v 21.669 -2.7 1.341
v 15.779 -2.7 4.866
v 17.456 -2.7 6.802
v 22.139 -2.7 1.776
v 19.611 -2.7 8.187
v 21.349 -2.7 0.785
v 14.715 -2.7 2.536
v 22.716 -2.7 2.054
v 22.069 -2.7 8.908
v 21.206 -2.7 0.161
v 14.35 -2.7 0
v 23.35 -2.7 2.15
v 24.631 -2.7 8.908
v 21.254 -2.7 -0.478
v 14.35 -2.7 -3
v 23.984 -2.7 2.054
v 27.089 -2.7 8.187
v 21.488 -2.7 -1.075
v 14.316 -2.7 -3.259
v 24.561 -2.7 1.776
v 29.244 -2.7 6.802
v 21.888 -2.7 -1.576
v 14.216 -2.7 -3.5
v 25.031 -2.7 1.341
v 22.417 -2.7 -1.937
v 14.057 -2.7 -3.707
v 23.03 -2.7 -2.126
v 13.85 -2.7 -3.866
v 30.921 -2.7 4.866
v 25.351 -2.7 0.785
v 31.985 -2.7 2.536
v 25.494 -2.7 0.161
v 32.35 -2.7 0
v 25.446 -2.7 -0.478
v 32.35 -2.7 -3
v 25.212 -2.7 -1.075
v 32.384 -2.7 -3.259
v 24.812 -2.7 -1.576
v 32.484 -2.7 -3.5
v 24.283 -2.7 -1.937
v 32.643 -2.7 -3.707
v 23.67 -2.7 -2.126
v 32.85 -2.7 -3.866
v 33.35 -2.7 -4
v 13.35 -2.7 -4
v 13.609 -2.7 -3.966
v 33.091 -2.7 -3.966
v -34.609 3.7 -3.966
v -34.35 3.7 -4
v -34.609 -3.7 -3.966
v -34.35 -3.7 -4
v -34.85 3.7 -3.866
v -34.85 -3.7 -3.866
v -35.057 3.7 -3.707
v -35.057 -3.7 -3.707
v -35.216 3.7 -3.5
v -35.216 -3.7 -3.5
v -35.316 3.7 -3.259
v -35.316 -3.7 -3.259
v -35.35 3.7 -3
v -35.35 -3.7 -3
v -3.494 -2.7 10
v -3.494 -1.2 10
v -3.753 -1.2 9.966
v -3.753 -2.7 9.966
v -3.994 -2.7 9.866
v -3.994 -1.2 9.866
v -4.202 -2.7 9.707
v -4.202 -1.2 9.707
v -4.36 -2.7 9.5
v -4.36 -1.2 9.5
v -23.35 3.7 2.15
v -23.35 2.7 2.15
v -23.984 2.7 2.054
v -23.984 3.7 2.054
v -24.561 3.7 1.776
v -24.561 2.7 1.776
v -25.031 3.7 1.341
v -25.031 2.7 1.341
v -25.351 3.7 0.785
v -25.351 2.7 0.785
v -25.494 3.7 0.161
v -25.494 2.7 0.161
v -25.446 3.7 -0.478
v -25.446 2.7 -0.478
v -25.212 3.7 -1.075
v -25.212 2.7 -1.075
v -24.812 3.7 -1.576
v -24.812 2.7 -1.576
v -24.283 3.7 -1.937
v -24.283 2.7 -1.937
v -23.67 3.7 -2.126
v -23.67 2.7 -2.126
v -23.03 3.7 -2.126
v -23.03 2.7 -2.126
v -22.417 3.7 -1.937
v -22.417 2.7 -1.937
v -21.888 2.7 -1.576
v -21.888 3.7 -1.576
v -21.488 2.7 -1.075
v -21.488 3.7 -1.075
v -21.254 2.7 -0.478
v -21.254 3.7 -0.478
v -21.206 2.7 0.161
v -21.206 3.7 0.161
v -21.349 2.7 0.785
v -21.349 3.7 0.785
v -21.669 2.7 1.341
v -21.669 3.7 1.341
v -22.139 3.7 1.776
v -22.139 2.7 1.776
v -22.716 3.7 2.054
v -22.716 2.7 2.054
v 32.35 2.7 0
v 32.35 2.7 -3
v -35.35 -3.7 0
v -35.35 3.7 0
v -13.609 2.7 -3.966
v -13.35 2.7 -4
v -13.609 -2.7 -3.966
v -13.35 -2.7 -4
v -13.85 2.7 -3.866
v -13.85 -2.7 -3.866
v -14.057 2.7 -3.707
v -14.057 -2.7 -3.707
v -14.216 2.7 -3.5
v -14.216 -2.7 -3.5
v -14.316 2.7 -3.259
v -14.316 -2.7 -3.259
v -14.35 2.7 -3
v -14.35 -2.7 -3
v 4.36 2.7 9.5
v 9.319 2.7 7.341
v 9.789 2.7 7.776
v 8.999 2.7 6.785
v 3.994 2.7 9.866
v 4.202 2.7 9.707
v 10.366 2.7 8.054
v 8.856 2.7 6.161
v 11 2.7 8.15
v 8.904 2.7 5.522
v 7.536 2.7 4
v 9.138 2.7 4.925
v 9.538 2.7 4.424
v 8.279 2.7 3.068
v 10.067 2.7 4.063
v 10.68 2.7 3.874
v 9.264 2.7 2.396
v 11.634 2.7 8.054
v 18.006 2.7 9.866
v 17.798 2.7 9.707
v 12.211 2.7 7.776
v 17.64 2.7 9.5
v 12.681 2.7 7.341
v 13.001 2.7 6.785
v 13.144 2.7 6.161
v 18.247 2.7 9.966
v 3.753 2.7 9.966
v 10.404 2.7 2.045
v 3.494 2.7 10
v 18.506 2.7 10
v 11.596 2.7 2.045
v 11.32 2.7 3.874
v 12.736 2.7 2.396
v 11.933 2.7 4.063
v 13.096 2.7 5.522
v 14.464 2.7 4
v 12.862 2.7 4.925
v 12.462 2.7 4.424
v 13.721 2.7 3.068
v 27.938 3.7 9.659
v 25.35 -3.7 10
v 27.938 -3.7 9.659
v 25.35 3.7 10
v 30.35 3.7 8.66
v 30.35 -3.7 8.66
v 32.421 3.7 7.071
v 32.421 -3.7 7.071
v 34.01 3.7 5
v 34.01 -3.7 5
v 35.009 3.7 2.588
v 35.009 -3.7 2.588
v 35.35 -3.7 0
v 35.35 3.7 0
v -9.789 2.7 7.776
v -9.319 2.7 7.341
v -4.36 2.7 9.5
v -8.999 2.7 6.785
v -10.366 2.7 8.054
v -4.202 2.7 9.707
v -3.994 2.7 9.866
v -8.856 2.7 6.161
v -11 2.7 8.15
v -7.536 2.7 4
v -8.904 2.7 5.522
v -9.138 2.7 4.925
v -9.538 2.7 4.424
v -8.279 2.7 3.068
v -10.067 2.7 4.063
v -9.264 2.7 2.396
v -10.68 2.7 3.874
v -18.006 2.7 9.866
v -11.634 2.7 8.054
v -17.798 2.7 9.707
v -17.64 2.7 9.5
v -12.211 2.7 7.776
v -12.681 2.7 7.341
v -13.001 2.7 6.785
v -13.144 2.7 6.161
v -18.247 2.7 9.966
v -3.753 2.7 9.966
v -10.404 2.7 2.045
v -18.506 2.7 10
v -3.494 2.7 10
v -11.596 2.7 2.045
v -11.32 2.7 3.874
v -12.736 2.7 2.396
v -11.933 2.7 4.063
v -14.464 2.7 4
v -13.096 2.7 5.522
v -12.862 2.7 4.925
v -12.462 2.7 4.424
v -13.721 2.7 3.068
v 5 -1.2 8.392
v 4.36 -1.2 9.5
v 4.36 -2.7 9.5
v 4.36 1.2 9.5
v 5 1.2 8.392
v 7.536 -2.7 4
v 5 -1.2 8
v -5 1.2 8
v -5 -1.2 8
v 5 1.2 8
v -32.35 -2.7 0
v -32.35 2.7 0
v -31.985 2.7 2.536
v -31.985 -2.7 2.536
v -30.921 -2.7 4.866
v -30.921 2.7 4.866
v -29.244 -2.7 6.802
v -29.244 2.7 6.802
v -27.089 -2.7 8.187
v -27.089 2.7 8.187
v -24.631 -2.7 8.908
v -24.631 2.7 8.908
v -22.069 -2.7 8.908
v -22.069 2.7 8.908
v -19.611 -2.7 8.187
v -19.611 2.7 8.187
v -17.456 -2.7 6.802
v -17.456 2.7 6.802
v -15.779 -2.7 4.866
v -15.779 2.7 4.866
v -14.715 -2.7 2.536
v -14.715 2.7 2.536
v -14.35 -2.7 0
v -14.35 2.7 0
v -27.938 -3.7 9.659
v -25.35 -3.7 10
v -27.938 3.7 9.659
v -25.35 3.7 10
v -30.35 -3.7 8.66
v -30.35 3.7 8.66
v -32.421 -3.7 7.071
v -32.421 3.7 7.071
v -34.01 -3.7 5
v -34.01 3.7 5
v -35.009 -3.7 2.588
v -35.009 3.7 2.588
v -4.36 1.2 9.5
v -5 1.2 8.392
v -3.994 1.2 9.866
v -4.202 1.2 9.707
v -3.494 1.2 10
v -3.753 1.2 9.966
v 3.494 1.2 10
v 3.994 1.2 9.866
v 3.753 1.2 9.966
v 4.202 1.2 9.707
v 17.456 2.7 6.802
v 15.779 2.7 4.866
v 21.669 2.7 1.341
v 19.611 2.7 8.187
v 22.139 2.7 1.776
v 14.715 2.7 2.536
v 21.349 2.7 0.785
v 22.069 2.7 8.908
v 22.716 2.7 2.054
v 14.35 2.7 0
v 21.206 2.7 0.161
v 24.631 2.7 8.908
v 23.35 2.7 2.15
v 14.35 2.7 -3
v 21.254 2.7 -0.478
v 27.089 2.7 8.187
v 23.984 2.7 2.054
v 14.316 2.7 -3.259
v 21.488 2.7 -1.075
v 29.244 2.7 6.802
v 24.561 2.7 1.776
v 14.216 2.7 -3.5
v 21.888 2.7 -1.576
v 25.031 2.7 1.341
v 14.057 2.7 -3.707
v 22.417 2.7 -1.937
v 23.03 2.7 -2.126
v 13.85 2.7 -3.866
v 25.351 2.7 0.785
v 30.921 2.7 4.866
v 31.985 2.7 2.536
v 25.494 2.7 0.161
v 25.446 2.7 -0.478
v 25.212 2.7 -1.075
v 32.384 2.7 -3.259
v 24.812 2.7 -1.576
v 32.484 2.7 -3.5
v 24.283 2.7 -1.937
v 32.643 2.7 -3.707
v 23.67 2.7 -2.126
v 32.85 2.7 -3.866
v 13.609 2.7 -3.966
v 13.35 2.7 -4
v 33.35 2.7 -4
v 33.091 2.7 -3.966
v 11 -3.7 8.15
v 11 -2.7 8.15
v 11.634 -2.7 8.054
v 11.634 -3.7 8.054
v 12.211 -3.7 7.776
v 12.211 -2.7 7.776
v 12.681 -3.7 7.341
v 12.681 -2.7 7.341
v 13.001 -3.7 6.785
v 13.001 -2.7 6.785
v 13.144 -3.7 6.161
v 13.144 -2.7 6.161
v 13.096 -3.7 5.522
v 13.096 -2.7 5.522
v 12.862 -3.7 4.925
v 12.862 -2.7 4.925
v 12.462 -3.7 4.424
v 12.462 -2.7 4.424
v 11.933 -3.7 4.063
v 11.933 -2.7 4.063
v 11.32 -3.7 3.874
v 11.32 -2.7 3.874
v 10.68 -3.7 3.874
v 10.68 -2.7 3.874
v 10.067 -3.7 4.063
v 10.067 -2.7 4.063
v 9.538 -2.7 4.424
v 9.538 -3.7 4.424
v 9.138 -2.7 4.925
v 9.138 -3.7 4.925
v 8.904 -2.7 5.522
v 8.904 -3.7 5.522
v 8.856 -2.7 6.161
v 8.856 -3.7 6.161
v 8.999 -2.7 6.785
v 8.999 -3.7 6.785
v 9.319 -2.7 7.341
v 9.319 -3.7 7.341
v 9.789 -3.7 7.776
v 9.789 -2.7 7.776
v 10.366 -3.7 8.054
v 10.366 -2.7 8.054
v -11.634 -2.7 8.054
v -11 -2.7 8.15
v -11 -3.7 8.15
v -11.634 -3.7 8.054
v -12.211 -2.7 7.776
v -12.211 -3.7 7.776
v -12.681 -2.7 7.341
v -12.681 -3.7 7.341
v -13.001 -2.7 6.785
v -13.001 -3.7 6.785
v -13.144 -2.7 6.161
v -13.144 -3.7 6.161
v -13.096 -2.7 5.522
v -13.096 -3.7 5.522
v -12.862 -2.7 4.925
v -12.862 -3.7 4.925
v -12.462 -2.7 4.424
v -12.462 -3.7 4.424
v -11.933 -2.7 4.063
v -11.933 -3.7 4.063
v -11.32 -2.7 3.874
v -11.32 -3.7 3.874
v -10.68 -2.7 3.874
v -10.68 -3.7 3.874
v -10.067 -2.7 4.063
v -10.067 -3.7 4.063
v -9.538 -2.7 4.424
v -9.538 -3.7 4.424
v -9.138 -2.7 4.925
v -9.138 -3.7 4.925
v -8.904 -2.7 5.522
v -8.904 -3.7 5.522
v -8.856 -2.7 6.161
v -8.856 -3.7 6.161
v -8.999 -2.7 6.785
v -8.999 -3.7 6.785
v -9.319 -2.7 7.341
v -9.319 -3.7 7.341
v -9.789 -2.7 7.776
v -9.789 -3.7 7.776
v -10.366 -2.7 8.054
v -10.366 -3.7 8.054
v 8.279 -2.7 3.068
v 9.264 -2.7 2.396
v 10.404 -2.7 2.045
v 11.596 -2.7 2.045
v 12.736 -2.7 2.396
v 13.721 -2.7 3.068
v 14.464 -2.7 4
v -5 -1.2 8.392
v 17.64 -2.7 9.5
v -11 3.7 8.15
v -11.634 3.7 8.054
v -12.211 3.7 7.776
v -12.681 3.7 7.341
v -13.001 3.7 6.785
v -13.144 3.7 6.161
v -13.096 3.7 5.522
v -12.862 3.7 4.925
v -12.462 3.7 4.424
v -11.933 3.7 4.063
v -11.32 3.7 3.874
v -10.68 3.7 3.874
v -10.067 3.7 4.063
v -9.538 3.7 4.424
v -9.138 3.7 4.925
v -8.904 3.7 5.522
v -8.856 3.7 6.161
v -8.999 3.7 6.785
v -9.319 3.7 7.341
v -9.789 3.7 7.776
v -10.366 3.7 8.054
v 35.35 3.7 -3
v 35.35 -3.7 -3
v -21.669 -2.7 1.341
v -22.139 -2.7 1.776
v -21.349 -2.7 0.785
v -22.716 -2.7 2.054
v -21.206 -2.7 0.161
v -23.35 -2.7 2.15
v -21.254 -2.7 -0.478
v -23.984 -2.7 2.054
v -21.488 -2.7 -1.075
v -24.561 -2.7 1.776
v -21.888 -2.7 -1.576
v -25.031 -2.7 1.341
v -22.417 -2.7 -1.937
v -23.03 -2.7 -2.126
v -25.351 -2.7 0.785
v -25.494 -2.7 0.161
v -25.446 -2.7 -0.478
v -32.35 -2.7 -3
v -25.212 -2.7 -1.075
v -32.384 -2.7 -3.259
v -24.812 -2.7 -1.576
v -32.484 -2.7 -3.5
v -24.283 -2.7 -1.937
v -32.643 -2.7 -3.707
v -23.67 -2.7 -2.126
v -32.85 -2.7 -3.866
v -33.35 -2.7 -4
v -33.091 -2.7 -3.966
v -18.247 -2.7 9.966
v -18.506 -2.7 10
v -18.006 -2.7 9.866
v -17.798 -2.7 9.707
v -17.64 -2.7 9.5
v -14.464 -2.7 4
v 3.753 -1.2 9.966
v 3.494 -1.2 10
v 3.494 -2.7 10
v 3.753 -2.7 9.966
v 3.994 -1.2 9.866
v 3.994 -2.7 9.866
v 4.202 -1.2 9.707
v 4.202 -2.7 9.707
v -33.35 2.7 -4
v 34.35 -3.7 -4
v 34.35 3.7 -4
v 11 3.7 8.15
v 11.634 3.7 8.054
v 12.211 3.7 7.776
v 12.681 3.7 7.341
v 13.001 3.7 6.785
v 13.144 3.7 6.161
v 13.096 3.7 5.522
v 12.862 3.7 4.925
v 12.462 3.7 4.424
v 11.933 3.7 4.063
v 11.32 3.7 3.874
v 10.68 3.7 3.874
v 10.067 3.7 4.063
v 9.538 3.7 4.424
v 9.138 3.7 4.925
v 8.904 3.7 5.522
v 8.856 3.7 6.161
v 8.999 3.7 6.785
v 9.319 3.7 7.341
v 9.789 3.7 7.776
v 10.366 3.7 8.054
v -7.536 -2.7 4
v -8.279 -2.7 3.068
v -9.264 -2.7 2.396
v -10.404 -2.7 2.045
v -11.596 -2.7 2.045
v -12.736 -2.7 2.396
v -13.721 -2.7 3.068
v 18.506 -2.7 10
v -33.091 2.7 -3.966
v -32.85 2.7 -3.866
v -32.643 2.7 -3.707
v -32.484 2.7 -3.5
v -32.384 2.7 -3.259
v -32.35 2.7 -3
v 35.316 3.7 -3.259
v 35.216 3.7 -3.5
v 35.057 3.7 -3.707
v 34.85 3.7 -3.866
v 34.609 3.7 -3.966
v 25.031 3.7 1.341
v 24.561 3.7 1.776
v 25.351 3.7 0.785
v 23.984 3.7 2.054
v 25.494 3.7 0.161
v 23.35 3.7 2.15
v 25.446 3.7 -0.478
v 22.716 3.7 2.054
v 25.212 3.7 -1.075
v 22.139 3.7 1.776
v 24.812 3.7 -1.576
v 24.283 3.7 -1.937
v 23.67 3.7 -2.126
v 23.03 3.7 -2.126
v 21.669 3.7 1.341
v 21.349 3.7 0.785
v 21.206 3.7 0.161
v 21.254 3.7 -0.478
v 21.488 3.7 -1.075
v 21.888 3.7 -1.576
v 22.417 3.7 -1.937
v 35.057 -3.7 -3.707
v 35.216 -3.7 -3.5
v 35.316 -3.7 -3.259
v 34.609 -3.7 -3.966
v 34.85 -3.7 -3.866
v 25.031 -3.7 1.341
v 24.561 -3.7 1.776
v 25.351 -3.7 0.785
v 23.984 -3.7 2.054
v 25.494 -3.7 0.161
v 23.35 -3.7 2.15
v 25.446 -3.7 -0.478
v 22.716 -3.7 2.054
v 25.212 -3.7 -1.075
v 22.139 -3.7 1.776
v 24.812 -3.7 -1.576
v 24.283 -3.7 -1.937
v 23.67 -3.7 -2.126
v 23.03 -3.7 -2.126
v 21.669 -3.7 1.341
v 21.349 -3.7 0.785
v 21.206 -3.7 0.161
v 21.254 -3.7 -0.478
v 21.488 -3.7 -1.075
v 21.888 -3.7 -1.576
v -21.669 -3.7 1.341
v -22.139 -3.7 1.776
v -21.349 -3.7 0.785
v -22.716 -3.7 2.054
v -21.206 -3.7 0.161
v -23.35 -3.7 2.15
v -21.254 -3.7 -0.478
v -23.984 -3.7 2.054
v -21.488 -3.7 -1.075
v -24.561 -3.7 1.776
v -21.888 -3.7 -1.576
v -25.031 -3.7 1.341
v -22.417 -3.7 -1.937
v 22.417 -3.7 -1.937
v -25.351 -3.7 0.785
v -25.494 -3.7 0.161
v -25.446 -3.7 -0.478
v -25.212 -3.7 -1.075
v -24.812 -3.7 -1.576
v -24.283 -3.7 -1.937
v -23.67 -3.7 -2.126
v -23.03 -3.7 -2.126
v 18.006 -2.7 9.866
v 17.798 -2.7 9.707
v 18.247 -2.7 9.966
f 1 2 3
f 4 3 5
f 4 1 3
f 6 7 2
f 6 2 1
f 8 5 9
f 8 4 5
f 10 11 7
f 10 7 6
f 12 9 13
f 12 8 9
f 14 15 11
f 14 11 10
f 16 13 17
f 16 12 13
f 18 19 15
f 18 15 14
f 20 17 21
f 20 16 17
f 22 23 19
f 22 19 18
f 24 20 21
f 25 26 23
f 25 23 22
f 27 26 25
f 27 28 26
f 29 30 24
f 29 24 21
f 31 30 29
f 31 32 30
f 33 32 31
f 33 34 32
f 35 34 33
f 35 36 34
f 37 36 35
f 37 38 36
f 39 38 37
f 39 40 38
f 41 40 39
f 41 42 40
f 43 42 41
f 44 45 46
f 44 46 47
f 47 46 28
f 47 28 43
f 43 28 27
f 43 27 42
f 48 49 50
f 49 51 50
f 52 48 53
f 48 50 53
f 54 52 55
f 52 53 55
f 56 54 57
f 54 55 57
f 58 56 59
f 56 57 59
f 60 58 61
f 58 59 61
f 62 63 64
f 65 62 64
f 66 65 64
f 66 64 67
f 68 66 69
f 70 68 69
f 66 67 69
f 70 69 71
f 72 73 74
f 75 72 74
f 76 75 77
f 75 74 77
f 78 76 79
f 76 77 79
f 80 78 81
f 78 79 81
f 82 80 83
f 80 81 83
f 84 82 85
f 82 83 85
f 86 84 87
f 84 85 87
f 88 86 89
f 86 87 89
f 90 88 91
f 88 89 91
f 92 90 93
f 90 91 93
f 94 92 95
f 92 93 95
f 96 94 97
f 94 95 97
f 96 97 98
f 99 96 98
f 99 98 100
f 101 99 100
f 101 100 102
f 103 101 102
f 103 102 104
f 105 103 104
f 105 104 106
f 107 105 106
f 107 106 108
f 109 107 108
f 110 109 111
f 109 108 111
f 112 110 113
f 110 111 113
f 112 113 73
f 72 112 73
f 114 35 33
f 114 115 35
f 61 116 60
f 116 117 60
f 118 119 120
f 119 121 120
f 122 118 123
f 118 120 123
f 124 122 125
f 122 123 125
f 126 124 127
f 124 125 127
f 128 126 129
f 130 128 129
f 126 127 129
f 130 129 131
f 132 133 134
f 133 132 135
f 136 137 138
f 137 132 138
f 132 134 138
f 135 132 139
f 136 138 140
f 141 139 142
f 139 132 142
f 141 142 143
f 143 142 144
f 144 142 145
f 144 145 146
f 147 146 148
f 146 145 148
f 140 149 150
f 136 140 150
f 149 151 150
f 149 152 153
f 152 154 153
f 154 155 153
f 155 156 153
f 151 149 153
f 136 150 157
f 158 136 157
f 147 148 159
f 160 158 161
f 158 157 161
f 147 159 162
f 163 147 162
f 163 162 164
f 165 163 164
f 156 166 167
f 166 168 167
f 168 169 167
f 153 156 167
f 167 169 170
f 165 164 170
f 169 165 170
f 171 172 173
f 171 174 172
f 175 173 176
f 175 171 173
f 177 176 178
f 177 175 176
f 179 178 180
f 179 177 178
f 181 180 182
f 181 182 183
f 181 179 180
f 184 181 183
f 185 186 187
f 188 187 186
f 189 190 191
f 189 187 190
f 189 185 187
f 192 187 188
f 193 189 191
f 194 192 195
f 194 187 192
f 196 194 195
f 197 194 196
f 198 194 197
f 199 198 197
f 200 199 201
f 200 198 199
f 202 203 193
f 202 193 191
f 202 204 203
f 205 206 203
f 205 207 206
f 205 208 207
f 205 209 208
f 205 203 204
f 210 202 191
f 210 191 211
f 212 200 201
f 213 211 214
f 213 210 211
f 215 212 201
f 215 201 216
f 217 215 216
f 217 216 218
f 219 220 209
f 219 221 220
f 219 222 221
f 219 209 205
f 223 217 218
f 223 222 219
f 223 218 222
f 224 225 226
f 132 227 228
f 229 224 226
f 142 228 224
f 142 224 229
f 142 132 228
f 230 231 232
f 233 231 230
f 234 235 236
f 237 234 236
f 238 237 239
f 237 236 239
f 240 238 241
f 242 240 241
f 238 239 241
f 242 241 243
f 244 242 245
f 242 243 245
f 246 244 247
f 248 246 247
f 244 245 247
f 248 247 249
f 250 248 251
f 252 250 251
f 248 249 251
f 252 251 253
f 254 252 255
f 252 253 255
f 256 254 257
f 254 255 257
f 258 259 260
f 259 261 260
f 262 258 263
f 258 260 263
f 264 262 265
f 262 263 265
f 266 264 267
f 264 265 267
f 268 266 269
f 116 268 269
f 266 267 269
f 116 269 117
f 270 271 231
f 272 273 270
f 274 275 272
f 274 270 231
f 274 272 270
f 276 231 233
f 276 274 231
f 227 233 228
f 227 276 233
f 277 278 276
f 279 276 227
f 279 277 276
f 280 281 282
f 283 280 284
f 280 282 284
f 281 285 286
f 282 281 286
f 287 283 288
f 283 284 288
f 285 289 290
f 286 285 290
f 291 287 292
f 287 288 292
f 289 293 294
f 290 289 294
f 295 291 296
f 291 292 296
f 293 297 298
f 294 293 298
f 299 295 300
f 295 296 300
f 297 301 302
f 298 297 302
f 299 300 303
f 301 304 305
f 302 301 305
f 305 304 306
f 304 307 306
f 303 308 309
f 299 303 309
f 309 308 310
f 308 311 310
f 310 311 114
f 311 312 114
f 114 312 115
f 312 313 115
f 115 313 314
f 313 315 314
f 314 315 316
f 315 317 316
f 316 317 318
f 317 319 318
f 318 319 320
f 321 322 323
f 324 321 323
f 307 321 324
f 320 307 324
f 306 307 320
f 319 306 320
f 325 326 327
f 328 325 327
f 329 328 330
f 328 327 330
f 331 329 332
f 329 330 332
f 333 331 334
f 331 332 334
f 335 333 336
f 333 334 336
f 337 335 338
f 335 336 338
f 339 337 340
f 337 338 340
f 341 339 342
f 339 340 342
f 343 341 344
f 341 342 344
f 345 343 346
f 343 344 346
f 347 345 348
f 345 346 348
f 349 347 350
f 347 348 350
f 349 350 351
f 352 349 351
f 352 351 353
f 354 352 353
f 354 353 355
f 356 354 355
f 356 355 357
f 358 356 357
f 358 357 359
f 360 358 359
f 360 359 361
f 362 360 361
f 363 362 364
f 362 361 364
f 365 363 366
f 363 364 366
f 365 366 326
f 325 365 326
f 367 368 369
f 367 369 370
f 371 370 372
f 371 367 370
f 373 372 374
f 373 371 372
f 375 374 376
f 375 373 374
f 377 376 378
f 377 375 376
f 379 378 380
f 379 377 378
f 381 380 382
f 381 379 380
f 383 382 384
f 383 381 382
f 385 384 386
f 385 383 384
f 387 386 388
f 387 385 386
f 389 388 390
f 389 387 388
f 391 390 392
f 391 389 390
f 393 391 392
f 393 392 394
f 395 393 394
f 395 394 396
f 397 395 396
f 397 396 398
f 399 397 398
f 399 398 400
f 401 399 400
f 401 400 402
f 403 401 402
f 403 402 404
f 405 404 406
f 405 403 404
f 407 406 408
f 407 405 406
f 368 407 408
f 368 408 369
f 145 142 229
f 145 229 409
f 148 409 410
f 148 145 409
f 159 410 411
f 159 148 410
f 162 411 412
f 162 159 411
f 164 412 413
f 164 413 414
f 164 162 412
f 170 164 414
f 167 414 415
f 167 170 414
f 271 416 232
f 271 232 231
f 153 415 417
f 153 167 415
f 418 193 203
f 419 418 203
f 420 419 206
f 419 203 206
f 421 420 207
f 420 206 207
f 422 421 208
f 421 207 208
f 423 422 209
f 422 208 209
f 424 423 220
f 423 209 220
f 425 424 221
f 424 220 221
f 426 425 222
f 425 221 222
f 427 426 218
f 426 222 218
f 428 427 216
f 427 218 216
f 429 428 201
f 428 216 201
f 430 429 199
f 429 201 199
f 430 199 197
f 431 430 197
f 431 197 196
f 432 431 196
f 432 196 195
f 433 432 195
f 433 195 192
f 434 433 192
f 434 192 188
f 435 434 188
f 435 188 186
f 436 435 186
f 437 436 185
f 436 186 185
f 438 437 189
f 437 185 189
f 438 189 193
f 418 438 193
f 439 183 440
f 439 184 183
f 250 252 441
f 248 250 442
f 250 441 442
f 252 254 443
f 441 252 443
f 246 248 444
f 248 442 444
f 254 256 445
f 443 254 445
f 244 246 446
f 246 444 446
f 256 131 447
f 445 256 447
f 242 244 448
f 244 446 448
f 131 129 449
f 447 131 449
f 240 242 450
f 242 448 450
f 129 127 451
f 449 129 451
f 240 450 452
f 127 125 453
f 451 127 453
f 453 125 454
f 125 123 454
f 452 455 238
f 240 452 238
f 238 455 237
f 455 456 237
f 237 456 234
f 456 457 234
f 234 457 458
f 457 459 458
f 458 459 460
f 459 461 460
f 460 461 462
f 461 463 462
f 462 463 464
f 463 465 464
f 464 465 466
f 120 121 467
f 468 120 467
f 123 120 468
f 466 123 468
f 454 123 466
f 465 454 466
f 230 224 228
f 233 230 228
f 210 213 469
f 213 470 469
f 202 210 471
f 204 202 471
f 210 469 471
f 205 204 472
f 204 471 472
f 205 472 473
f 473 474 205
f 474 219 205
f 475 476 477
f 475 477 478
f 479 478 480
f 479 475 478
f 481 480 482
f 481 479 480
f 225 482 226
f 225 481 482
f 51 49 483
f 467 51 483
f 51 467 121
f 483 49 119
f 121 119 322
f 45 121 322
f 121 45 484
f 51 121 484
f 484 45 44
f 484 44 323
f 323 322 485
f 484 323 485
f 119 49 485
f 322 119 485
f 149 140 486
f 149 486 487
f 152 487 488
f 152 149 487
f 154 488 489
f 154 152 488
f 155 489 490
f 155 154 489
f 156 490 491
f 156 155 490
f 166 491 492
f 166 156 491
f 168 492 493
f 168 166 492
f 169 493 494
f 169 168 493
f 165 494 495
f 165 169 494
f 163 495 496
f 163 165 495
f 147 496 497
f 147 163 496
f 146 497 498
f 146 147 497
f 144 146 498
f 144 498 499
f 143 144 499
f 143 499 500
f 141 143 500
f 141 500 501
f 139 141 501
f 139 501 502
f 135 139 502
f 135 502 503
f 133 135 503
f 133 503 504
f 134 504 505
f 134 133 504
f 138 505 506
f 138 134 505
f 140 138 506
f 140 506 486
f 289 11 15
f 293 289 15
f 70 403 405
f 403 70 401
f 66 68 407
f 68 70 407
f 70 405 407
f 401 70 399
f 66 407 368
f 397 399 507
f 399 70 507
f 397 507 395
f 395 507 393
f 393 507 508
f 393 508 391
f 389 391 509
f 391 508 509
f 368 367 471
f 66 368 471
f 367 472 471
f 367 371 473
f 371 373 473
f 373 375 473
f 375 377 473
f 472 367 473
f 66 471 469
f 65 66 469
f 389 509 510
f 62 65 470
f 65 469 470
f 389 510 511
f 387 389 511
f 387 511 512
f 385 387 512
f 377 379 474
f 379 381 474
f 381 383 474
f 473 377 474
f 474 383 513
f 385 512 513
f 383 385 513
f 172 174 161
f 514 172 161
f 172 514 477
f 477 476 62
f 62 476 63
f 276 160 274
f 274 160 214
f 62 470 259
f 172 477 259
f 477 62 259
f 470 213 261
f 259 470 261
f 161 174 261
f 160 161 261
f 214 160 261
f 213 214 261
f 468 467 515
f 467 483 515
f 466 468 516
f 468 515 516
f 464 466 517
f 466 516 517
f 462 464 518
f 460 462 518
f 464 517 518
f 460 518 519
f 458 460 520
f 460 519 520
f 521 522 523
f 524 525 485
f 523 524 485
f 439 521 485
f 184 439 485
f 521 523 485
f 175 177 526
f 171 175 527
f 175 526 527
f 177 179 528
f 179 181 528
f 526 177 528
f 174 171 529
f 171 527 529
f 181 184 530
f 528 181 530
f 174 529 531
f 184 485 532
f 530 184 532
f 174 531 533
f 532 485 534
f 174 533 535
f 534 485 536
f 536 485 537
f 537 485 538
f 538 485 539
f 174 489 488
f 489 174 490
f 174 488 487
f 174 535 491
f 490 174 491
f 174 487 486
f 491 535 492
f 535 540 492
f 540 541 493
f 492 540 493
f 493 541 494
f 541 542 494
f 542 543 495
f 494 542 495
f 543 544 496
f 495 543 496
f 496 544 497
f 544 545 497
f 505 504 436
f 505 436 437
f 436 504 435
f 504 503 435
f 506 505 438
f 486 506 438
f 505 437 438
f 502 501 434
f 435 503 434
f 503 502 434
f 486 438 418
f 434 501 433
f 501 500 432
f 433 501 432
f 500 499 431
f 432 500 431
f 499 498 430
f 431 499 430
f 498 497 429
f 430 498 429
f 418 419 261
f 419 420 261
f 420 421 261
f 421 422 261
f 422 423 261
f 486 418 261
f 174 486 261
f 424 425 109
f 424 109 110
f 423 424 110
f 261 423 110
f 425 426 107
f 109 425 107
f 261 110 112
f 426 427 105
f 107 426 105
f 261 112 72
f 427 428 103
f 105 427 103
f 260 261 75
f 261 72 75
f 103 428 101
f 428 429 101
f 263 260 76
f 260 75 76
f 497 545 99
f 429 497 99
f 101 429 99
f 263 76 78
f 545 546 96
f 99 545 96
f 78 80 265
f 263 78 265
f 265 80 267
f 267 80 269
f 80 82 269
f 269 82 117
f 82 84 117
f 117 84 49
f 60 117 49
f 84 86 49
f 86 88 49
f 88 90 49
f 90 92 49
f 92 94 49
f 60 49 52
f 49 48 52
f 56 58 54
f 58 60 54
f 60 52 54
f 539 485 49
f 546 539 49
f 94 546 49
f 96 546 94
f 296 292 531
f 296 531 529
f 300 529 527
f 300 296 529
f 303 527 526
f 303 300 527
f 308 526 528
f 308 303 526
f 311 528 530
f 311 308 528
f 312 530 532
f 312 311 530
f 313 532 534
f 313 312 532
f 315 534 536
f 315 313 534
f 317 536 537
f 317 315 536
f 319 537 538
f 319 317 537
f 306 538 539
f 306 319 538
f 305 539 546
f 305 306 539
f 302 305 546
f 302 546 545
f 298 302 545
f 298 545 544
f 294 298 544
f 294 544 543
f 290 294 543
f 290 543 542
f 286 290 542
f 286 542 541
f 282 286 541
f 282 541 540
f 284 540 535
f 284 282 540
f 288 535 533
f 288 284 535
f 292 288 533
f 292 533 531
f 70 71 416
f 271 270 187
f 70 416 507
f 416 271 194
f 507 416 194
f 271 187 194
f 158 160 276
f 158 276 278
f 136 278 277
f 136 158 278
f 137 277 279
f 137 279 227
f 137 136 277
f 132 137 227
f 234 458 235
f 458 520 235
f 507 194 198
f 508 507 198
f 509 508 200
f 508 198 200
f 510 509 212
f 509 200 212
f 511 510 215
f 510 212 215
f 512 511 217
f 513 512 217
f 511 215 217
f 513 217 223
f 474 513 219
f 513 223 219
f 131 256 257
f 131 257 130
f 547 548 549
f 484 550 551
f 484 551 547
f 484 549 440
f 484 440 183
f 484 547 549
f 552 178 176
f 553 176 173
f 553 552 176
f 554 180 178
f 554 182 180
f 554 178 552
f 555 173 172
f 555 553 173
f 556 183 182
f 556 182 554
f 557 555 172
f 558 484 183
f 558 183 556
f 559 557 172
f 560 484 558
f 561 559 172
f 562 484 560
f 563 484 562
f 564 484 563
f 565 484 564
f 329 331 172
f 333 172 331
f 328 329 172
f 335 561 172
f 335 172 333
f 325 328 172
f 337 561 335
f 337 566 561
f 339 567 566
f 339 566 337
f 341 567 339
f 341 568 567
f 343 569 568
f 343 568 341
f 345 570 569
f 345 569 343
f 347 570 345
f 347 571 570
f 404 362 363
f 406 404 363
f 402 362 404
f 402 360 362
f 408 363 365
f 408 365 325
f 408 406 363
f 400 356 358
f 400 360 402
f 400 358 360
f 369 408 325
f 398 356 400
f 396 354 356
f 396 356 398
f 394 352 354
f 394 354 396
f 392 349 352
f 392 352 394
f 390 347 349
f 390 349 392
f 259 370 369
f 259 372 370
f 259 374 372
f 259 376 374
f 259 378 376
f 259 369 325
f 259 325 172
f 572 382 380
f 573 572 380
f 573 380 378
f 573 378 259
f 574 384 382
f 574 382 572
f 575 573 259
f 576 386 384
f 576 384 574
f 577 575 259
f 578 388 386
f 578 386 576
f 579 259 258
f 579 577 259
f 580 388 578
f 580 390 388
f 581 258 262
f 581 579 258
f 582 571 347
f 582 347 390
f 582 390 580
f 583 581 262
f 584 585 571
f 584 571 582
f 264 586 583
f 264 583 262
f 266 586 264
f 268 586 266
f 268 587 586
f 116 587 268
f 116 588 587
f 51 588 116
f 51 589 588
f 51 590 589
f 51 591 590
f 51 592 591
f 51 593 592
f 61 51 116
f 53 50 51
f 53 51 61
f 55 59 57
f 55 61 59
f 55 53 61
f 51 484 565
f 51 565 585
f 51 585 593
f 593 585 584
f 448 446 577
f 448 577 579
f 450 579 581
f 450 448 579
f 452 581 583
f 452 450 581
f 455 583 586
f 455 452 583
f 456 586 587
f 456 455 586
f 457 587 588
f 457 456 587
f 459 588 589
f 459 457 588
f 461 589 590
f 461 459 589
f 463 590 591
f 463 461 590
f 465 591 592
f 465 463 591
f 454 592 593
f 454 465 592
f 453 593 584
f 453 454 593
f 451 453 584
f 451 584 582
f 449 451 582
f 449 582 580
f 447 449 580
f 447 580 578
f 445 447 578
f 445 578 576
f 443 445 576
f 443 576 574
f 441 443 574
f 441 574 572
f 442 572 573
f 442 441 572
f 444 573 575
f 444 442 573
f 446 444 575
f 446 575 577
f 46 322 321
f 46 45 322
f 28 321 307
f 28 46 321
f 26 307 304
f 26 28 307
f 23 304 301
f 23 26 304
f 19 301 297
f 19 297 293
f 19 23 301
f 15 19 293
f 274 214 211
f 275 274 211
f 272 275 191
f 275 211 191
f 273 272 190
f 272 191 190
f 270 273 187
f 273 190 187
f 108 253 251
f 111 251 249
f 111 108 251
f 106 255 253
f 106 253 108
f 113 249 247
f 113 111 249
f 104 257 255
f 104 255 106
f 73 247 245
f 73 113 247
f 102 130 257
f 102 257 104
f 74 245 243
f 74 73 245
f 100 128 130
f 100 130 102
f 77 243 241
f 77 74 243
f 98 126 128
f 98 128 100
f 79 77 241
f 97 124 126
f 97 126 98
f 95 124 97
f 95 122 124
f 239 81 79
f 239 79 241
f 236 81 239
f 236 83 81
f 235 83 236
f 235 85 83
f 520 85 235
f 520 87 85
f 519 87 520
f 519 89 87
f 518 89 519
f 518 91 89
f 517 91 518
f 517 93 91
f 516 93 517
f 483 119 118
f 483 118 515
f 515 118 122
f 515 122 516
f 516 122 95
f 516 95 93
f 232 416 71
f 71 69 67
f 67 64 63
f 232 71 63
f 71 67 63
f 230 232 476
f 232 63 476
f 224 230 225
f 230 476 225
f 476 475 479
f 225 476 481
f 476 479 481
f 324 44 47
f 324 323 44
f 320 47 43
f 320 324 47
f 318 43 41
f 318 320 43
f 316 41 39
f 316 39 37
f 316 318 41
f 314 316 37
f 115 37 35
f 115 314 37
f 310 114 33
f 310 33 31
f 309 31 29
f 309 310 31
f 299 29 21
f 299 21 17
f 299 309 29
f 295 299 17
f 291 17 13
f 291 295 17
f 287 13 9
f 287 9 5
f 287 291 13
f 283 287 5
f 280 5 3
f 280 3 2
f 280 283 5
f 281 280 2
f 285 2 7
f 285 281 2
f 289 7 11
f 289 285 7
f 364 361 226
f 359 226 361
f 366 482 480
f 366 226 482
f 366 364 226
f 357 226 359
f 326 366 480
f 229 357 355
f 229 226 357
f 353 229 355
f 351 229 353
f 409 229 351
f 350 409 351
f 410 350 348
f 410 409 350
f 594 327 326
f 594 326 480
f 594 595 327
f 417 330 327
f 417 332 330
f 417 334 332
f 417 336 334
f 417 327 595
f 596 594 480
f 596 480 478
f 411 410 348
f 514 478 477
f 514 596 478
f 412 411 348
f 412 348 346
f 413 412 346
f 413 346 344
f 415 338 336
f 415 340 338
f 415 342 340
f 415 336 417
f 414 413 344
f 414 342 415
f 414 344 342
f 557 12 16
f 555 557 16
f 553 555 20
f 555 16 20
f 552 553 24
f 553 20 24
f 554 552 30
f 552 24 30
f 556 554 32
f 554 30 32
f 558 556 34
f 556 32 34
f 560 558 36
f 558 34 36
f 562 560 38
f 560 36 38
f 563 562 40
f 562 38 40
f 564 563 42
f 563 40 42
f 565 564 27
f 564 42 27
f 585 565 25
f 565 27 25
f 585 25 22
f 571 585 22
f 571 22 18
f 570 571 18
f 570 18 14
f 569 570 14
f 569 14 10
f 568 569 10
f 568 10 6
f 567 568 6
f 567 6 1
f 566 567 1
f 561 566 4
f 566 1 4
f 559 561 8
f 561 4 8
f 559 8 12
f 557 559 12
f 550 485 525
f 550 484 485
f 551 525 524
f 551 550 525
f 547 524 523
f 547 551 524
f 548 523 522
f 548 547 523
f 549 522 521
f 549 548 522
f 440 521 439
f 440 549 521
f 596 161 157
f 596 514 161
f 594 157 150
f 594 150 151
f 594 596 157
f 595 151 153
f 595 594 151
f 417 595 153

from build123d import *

# Parameters (mm, degrees)
BOSS_EXTRUDE6_DEPTH = 2.7
BOSS_EXTRUDE7_START = 2.7
SKETCH2_4_R         = 4
SKETCH2_4_R_2       = 2.15
BOSS_EXTRUDE7_DEPTH = 1
FILLET1_R           = 1
CUT_EXTRUDE1_START  = 10
SKETCH3_W           = 10
SKETCH3_H           = 2.4
CUT_EXTRUDE1_DEPTH  = 2


with BuildPart() as part:
    # Sketch2 → Boss-Extrude6 (new body)
    with BuildSketch(Plane(origin=(0, 0, 0), x_dir=(1, 0, 0), z_dir=(0, 1, 0))):
        with BuildLine():
            Line((14.35, 4), (0, 4))
            Line((0, 4), (0, -10))
            Line((0, -10), (4.07179677, -10))
            Line((4.07179677, -10), (7.535898385, -4))
            ThreePointArc((7.535898385, -4), (11, -2), (14.464101615, -4))
            Line((14.464101615, -4), (17.92820323, -10))
            Line((17.92820323, -10), (25.35, -10))
            ThreePointArc((25.35, -10), (32.421067812, -7.071067812), (35.35, 0))
            Line((35.35, 0), (35.35, 4))
            Line((35.35, 4), (32.35, 4))
            Line((32.35, 4), (32.35, 0))
            ThreePointArc((32.35, 0), (23.35, -9), (14.35, 0))
            Line((14.35, 0), (14.35, 4))
        make_face()
    extrude(amount=BOSS_EXTRUDE6_DEPTH)

    # Sketch2<4> → Boss-Extrude7 (add)
    # profile 1 of 7: a face of its own
    with BuildSketch(Plane(origin=(0, 0, 0), x_dir=(1, 0, 0), z_dir=(0, 1, 0)).offset(BOSS_EXTRUDE7_START)):
        with BuildLine():
            Line((14.35, 4), (0, 4))
            Line((0, 4), (0, -10))
            Line((0, -10), (4.07179677, -10))
            Line((4.07179677, -10), (7.535898385, -4))
            ThreePointArc((7.535898385, -4), (11, -2), (14.464101615, -4))
            Line((14.464101615, -4), (17.92820323, -10))
            Line((17.92820323, -10), (25.35, -10))
            ThreePointArc((25.35, -10), (32.421067812, -7.071067812), (35.35, 0))
            Line((35.35, 0), (35.35, 4))
            Line((35.35, 4), (32.35, 4))
            Line((32.35, 4), (32.35, 0))
            ThreePointArc((32.35, 0), (23.35, -9), (14.35, 0))
            Line((14.35, 0), (14.35, 4))
        make_face()
    # profile 2 of 7: a face of its own
    with BuildSketch(Plane(origin=(0, 0, 0), x_dir=(1, 0, 0), z_dir=(0, 1, 0)).offset(BOSS_EXTRUDE7_START)):
        with BuildLine():
            Line((7.535898385, -4), (4.07179677, -10))
            Line((4.07179677, -10), (11, -10))
            ThreePointArc((11, -10), (7.535898385, -8), (7.535898385, -4))
        make_face()
    # profile 3 of 7: a face of its own
    with BuildSketch(Plane(origin=(0, 0, 0), x_dir=(1, 0, 0), z_dir=(0, 1, 0)).offset(BOSS_EXTRUDE7_START)):
        with Locations((11, -6)):
            Circle(SKETCH2_4_R)
        with Locations(Location((11, -6, 0), (0, 0, 270))):
            Circle(SKETCH2_4_R_2, mode=Mode.SUBTRACT)
    # profile 4 of 7: a face of its own
    with BuildSketch(Plane(origin=(0, 0, 0), x_dir=(1, 0, 0), z_dir=(0, 1, 0)).offset(BOSS_EXTRUDE7_START)):
        with BuildLine():
            ThreePointArc((15, -6), (13.828427125, -8.828427125), (11, -10))
            Line((11, -10), (17.92820323, -10))
            Line((17.92820323, -10), (14.464101615, -4))
            ThreePointArc((14.464101615, -4), (14.863703305, -4.96472382), (15, -6))
        make_face()
    # profile 5 of 7: a face of its own
    with BuildSketch(Plane(origin=(0, 0, 0), x_dir=(1, 0, 0), z_dir=(0, 1, 0)).offset(BOSS_EXTRUDE7_START)):
        with BuildLine():
            Line((31.412257748, 4), (15.287742252, 4))
            ThreePointArc((15.287742252, 4), (14.587571121, 2.054224947), (14.35, 0))
            ThreePointArc((14.35, 0), (23.35, -9), (32.35, 0))
            ThreePointArc((32.35, 0), (32.112428879, 2.054224947), (31.412257748, 4))
        make_face()
        with Locations(Location((23.35, 0, 0), (0, 0, 270))):
            Circle(SKETCH2_4_R_2, mode=Mode.SUBTRACT)
    # profile 6 of 7: a face of its own
    with BuildSketch(Plane(origin=(0, 0, 0), x_dir=(1, 0, 0), z_dir=(0, 1, 0)).offset(BOSS_EXTRUDE7_START)):
        with BuildLine():
            Line((15.287742252, 4), (14.35, 4))
            Line((14.35, 4), (14.35, 0))
            ThreePointArc((14.35, 0), (14.587571121, 2.054224947), (15.287742252, 4))
        make_face()
    # profile 7 of 7: a face of its own
    with BuildSketch(Plane(origin=(0, 0, 0), x_dir=(1, 0, 0), z_dir=(0, 1, 0)).offset(BOSS_EXTRUDE7_START)):
        with BuildLine():
            Line((32.35, 4), (31.412257748, 4))
            ThreePointArc((31.412257748, 4), (32.112428879, 2.054224947), (32.35, 0))
            Line((32.35, 0), (32.35, 4))
        make_face()
    extrude(amount=BOSS_EXTRUDE7_DEPTH)

    # Mirror1: part across plane


with BuildPart() as part_1:
    add(part.part)
    add(part.part.mirror(Plane.ZX))

    # Mirror2: part across plane


with BuildPart() as part_2:
    add(part_1.part)
    add(part_1.part.mirror(Plane(origin=(0, 0, 0), x_dir=(0, 0, 1), z_dir=(1, 0, 0))))

    # Fillet1
    fillet1_edges = [part_2.edges().sort_by_distance(p)[0] for p in [
        (-35.35, 0, -4),
        (-14.35, 0, -4),
        (-32.35, 0, -4),
        (-17.92820323, 0, 10),
        (-4.07179677, 0, 10),
        (17.92820323, 0, 10),
        (4.07179677, 0, 10),
        (14.35, 0, -4),
        (32.35, 0, -4),
        (35.35, 0, -4),
    ]]
    fillet(fillet1_edges, radius=FILLET1_R)

    # Sketch3 → Cut-Extrude1 (cut)
    with BuildSketch(Plane.XY.offset(CUT_EXTRUDE1_START)):
        Rectangle(SKETCH3_W, SKETCH3_H)
    extrude(amount=-CUT_EXTRUDE1_DEPTH, mode=Mode.SUBTRACT)


solid = part_2.part
